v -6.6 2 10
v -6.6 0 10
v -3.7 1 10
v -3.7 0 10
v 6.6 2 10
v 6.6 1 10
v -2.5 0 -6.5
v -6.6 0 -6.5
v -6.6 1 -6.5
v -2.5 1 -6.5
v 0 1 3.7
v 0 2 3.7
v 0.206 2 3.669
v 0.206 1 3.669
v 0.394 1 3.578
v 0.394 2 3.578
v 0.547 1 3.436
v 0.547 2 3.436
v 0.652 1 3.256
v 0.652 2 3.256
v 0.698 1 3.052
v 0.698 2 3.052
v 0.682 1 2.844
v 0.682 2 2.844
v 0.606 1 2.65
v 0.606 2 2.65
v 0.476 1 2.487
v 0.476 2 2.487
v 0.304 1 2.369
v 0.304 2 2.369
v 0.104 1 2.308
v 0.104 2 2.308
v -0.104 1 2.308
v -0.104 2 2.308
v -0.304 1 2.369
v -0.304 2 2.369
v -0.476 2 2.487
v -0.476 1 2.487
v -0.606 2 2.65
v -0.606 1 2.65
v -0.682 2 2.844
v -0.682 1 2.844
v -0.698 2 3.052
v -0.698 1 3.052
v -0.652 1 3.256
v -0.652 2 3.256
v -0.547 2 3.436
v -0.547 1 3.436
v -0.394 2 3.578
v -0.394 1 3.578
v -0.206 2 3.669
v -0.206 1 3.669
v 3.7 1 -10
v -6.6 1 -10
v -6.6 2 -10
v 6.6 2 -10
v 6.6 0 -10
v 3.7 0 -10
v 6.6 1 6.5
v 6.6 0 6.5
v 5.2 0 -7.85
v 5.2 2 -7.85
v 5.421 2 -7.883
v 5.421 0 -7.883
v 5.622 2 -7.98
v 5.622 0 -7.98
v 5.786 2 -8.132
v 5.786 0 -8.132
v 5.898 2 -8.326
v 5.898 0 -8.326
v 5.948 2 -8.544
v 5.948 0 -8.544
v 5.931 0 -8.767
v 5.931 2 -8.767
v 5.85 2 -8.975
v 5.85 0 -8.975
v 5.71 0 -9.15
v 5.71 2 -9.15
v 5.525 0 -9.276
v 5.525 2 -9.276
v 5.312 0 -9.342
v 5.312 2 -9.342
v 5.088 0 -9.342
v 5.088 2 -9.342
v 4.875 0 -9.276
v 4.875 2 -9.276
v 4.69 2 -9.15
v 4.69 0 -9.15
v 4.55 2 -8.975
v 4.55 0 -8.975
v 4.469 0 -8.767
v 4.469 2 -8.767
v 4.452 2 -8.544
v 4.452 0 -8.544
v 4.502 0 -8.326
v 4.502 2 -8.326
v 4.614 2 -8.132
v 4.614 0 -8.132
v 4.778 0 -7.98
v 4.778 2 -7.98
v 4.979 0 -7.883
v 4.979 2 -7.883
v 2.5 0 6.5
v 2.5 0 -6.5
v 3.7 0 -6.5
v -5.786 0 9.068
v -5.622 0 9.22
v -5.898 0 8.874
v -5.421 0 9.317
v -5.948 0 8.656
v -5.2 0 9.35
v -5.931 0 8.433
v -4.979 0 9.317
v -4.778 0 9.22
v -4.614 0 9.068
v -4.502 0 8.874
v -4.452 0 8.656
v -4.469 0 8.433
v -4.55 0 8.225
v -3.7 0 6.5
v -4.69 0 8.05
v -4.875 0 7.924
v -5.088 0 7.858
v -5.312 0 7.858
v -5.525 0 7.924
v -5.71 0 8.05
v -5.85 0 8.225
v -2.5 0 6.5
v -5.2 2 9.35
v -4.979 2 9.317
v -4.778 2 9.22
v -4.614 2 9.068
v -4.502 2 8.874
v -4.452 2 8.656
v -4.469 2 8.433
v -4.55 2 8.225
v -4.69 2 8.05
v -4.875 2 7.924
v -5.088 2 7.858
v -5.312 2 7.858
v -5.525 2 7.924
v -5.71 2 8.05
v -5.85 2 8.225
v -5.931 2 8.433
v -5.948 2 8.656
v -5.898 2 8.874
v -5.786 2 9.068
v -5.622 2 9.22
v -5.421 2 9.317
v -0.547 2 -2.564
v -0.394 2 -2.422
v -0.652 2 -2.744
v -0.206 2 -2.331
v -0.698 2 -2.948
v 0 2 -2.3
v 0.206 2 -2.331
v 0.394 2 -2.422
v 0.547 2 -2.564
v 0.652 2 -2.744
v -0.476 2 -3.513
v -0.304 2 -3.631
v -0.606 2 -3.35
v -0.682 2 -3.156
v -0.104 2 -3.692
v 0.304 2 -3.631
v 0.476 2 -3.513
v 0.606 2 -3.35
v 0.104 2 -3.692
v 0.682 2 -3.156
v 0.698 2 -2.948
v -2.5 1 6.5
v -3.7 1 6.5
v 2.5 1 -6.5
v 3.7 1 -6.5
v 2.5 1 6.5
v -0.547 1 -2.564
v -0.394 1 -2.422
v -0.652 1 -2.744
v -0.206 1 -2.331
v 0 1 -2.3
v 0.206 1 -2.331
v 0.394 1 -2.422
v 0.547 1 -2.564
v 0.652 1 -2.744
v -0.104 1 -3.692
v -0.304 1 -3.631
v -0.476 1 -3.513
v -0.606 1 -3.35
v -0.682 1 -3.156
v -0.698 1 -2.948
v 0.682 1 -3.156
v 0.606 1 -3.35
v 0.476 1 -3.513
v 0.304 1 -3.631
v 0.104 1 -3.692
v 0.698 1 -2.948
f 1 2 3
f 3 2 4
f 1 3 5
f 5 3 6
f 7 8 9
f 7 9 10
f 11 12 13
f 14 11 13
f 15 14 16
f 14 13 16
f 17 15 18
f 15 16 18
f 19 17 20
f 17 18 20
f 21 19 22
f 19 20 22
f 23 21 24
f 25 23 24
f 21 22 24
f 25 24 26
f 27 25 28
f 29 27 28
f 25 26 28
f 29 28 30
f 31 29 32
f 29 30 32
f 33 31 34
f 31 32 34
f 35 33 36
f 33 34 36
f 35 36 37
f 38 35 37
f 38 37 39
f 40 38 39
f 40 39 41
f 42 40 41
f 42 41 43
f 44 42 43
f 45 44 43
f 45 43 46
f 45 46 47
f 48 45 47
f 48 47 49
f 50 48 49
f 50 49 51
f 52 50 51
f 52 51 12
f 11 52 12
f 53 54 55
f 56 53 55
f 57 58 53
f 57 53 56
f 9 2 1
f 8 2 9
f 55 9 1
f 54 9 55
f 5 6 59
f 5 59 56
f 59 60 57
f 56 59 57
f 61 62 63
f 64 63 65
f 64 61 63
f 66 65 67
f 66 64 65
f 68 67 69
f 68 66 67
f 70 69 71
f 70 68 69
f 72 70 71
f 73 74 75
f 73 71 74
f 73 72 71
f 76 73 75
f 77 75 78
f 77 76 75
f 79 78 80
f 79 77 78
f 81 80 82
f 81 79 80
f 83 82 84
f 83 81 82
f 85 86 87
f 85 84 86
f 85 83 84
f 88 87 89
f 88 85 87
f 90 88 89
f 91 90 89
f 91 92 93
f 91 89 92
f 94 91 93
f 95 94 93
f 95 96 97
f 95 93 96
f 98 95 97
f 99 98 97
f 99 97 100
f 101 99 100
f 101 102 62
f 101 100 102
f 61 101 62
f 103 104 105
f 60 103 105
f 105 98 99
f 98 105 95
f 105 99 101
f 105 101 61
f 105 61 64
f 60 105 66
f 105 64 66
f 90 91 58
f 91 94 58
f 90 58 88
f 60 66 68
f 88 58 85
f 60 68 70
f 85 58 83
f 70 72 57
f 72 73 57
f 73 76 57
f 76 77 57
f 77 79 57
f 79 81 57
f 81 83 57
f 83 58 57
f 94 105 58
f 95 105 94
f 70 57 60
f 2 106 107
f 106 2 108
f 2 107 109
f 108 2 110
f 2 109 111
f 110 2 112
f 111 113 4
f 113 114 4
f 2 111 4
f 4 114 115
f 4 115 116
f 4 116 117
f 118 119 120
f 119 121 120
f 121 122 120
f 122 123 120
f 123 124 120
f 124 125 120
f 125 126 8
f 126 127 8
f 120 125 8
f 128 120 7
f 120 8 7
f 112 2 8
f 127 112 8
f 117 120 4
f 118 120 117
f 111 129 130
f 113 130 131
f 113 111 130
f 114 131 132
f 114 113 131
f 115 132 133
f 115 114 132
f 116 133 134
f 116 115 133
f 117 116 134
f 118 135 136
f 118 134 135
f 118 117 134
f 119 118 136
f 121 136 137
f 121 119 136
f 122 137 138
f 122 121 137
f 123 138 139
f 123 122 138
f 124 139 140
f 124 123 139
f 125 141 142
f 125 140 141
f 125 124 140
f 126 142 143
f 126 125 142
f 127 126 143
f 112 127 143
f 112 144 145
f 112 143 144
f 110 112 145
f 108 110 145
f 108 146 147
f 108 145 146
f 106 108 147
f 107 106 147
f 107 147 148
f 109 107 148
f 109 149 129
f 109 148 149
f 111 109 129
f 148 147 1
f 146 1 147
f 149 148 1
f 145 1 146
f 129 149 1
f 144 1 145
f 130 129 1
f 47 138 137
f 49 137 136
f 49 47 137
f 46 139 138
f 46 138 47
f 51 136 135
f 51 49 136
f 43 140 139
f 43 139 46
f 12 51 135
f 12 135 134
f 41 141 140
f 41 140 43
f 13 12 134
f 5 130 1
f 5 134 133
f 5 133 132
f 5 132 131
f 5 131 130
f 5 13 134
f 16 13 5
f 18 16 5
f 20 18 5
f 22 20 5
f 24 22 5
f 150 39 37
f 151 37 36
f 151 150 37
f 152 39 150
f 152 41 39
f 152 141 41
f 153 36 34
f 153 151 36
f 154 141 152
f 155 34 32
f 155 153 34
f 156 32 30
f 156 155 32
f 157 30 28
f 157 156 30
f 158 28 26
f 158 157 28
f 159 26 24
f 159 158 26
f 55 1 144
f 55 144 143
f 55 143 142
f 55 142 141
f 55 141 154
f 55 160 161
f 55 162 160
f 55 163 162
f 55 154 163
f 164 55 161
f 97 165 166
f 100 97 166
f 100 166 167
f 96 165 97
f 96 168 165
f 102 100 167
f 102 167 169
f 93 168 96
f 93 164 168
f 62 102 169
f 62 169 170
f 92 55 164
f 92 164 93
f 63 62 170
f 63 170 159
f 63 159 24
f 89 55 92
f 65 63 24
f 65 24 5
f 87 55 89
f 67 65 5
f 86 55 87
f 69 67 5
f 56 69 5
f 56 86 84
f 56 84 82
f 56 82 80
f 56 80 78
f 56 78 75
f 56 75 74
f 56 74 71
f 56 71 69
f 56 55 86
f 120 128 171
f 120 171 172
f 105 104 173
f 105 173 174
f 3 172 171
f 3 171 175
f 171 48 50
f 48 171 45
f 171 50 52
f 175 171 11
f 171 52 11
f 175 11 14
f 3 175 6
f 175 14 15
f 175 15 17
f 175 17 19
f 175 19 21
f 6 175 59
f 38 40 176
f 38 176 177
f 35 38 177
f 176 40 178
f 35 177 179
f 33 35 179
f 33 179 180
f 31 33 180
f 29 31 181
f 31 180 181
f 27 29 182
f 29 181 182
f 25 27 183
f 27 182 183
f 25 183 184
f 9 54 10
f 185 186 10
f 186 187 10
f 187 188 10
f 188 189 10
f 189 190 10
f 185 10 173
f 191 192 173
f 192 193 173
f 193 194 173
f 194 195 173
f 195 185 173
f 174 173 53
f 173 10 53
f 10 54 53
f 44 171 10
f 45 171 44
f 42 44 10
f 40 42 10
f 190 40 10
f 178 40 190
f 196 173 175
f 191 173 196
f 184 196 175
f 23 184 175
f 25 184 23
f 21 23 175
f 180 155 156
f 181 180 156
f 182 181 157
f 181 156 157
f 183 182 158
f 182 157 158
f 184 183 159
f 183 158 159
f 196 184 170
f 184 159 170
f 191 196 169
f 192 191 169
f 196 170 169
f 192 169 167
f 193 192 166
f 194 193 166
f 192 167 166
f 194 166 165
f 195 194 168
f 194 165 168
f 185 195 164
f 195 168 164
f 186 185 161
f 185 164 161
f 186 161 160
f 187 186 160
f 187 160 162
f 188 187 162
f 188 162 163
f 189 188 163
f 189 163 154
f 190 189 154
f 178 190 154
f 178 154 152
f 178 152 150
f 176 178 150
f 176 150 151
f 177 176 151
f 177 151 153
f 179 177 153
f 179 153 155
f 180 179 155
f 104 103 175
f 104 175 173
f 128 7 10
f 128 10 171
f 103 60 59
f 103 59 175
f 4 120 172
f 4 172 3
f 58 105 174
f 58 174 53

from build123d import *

# Parameters (mm, degrees)
SKETCH_1_W          = 13.2
SKETCH_1_H          = 20
EXTRUDE_1_DEPTH     = 2
SKETCH_1_3_R        = 0.75
CUT_EXTRUDE_2_DEPTH = 13.147427711
CUT_EXTRUDE_START   = -2
CUT_EXTRUDE_1_DEPTH = 1
SKETCH_2_4_R        = 0.7
CUT_EXTRUDE_3_DEPTH = 13.147427711


with BuildPart() as part:
    # 草图1 → 凸台-拉伸1 (new body)
    with BuildSketch(Plane(origin=(0, 0, 0), x_dir=(1, 0, 0), z_dir=(0, 1, 0))):
        Rectangle(SKETCH_1_W, SKETCH_1_H)
    extrude(amount=EXTRUDE_1_DEPTH)

    # 草图1<3> → 切除-拉伸2 (cut, through all)
    with BuildSketch(Plane(origin=(0, 0, 0), x_dir=(1, 0, 0), z_dir=(0, 1, 0))):
        with Locations(Location((-5.2, -8.6, 0), (0, 0, 270))):
            Circle(SKETCH_1_3_R)
        with Locations(Location((5.2, 8.6, 0), (0, 0, 270))):
            Circle(SKETCH_1_3_R)
    extrude(amount=CUT_EXTRUDE_2_DEPTH, mode=Mode.SUBTRACT)

    # 草图2 → 切除-拉伸1 (cut)
    with BuildSketch(Plane(origin=(0, 2, 0), x_dir=(1, 0, 0), z_dir=(0, 1, 0)).offset(CUT_EXTRUDE_START)):
        Polygon((3.7, 10), (-6.6, 10), (-6.6, 6.5), (-2.5, 6.5), (-2.5, -6.5), (-3.7, -6.5), (-3.7, -10), (6.6, -10), (6.6, -6.5), (2.5, -6.5), (2.5, 6.5), (3.7, 6.5), align=None)
    extrude(amount=CUT_EXTRUDE_1_DEPTH, mode=Mode.SUBTRACT)

    # 草图2<4> → 切除-拉伸3 (cut, through all)
    with BuildSketch(Plane(origin=(0, 2, 0), x_dir=(1, 0, 0), z_dir=(0, 1, 0))):
        with Locations(Location((0, 3, 0), (0, 0, 270))):
            Circle(SKETCH_2_4_R)
        with Locations(Location((0, -3, 0), (0, 0, 270))):
            Circle(SKETCH_2_4_R)
    extrude(amount=-CUT_EXTRUDE_3_DEPTH, mode=Mode.SUBTRACT)


solid = part.part
